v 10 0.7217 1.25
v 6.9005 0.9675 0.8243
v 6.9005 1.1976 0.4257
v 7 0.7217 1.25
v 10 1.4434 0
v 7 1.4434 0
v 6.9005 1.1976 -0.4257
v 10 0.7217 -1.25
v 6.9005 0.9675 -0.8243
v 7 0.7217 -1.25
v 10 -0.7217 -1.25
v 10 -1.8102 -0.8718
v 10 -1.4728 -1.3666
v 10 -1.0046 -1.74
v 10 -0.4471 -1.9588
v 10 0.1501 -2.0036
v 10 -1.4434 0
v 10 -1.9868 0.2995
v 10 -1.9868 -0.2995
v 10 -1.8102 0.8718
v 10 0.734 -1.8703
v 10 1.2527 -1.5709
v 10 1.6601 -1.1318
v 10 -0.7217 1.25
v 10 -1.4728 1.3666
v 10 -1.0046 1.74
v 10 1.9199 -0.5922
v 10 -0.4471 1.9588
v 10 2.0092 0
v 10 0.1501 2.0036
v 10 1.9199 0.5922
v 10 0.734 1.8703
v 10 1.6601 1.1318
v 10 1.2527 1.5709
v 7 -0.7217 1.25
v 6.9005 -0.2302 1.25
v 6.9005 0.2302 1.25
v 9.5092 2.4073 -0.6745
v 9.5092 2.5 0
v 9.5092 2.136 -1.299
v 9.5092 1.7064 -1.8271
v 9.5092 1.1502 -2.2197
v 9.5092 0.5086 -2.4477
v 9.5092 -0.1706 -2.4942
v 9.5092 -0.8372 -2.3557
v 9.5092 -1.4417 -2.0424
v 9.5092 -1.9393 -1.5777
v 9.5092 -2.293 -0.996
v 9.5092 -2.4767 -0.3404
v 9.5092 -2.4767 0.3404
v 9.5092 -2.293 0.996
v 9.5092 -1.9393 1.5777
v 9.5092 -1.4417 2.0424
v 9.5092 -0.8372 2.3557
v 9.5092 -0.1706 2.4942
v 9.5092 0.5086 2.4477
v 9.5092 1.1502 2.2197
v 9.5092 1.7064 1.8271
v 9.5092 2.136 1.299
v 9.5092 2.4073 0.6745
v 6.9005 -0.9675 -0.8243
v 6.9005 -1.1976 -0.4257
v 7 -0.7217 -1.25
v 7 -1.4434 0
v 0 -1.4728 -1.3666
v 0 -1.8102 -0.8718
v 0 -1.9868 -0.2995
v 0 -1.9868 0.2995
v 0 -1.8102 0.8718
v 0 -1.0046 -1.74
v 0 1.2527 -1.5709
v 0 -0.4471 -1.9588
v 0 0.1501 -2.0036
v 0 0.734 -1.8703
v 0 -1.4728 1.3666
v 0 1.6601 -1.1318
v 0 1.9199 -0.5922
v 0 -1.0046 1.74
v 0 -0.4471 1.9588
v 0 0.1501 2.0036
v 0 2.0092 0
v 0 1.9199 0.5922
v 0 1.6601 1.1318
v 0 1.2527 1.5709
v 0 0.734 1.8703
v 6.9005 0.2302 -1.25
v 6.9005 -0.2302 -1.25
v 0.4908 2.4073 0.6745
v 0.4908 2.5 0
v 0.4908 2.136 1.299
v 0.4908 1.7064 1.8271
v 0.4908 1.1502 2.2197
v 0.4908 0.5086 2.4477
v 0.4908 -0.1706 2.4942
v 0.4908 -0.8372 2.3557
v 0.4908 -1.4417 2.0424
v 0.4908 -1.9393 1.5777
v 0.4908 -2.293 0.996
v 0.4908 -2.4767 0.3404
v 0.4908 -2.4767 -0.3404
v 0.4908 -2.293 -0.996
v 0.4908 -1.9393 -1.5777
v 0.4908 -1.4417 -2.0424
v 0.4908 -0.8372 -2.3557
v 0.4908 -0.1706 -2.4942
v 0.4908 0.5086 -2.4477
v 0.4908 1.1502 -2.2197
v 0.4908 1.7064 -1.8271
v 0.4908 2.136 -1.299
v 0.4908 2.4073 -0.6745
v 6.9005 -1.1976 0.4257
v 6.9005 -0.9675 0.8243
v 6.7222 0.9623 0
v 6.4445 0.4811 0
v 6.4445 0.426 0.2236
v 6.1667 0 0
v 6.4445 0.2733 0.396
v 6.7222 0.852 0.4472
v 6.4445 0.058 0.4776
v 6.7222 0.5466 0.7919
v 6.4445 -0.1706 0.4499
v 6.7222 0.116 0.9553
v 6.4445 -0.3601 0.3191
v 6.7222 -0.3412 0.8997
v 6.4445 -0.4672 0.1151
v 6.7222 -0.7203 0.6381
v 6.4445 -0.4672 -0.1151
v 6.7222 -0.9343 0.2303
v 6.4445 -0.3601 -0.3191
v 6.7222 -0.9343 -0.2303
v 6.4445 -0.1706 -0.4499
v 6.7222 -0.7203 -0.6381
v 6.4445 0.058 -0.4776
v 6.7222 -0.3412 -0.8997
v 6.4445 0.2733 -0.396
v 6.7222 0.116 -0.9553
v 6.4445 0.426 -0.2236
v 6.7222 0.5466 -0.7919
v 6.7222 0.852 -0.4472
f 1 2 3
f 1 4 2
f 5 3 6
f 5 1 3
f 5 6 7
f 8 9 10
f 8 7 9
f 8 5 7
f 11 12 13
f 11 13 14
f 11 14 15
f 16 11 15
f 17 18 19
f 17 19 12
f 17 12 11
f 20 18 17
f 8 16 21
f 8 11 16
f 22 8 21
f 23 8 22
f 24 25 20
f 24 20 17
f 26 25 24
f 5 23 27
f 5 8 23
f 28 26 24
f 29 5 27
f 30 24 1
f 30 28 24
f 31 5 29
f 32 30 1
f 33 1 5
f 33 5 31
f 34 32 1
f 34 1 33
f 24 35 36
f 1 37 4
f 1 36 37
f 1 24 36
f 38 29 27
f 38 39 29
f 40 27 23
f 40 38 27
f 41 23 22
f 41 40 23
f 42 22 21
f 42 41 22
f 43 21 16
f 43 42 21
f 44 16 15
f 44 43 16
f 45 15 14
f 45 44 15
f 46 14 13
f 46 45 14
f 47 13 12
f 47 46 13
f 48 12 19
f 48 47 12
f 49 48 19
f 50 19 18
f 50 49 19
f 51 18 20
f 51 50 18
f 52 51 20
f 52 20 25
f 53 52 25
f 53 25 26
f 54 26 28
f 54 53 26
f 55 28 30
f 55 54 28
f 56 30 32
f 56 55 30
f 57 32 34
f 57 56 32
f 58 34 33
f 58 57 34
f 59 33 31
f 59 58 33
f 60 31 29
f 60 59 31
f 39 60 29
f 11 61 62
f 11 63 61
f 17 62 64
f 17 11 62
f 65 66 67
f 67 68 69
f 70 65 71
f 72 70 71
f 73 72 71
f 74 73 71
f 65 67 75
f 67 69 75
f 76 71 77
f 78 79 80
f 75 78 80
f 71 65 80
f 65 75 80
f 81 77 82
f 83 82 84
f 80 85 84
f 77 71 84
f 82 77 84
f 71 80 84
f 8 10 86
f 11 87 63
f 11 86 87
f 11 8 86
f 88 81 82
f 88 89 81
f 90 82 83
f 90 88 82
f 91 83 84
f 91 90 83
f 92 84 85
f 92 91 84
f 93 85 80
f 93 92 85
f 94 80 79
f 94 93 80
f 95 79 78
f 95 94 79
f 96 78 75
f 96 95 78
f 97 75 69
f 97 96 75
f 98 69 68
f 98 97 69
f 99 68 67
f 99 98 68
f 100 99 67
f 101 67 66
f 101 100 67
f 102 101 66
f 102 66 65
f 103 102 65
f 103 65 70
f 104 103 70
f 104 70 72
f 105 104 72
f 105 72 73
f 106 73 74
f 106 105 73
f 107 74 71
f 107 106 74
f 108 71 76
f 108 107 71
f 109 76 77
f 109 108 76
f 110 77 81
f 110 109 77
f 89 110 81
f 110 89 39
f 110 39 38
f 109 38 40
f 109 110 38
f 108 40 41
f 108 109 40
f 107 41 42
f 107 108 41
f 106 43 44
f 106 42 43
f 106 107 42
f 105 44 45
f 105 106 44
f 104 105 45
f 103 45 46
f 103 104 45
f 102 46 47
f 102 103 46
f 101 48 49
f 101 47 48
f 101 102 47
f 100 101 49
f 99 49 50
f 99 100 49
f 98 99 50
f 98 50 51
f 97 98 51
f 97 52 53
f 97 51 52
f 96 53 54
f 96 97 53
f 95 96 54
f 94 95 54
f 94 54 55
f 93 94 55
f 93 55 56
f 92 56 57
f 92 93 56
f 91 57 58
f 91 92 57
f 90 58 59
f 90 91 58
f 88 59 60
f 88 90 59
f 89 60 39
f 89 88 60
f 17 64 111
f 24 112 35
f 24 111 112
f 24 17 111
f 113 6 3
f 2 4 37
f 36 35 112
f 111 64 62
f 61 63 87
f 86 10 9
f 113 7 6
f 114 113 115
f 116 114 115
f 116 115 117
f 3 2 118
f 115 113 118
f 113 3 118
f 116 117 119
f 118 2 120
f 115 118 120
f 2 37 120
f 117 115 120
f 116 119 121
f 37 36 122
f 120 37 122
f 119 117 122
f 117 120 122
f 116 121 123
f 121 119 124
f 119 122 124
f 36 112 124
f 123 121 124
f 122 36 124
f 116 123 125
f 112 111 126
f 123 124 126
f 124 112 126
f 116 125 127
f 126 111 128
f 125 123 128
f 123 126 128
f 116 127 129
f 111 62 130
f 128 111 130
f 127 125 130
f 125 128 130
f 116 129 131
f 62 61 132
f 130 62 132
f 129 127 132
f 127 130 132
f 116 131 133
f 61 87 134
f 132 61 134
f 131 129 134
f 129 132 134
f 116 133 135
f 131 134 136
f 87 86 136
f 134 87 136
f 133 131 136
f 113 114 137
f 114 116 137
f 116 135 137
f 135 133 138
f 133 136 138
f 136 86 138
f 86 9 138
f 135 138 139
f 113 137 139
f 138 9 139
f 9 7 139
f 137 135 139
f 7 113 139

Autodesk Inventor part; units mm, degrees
ref_plane "YZ Plane" through (0, 0, 0) normal (1, 0, 0) x (0, 1, 0)
ref_plane "XZ Plane" through (0, 0, 0) normal (0, 1, 0) x (-1, 0, 0)
sketch "Skizze1" plane through (0, 0, 0) normal (0, 0, 1) x (1, 0, 0)
  line L0 (0, 0) -> (6.1667, 0)
  line L1 (10, 1.4434) -> (10, 2.5)
  line L2 (10, 2.5) -> (0, 2.5)
  line L3 (10, 1.4434) -> (7, 1.4434)
  line L4 (7, 1.4434) -> (6.1667, 0)
  line L5 (0, -0.5) -> (0, 3) projected
  line L6 (0, 2.5) -> (0, 0)
  dimension "d0" = 3
  dimension "d1" = 60
  dimension "d2" = 5
  dimension "d3" = 2.8868
  dimension "d5" = 10
revolve "Körper" add sketch "Skizze1" angle 360 about axis through (0, 0, 0) along (1, 0, 0)
sketch "Skizze2" plane through (10, 0, 0) normal (1, 0, 0) x (0, 1, 0)
  circle A0 centre (0, 0) radius 1.4434 projected
  line L0 (-0.7217, 1.25) -> (0.7217, 1.25)
  line L1 (0.7217, 1.25) -> (1.4434, 0)
  line L2 (1.4434, 0) -> (0.7217, -1.25)
  line L3 (0.7217, -1.25) -> (-0.7217, -1.25)
  line L4 (-0.7217, -1.25) -> (-1.4434, 0)
  line L5 (-1.4434, 0) -> (-0.7217, 1.25)
  point P0 (0, 0)
  point P1 (0, 0)
extrude "Loch" add sketch "Skizze2" against normal up to next contours L1 A0 | A0 L2 | L0 A0 | A0 L3 | L5 A0 | A0 L4
thread "Gewinde" size "M5x0.8" class "6g" standard "ISO Metric profile" length 10
chamfer "Fase1" distance 0.4908 angle 45 1 edges at (10, -2.5, 0) measured on face at (6.6667, 2.4919, -0.2012)
chamfer "Fase2" distance 0.4908 angle 45 1 edges at (0, -2.5, 0) measured on face at (3.1697, 2.4919, -0.2012)
ref_plane "Work Plane1" through (5, 0, 0) normal (0, 0, 1) x (1, 0, 0)
equation "\"d0\" = INTI"
equation "\"d2\" = NND"
equation "\"d3\" = 1.1547 * SW"
equation "\"d5\" = NLG"
equation "\"d8\" = NLG"
equation "\"d10\" = -0.5 * GD1 + 0.5 * NND"
equation "\"d11\" = FAWI"
equation "\"d34\" = -0.5 * GD1 + 0.5 * NND"
equation "\"d12\" = -0.5 * GD1 + 0.5 * NND"
equation "\"d13\" = FAWI"
equation "\"d35\" = -0.5 * GD1 + 0.5 * NND"
equation "\"NND\" = 5"
equation "\"NLG\" = 10"
equation "\"INTI\" = 3"
equation "\"FAWI\" = 45deg"
equation "\"SW\" = 2.5"
equation "\"GD1\" = THREADDIA - 1.2269 * PTC"
equation "\"SPD\" = 3.5"
equation "\"GUL\" = 0.61345 * PTC"
equation "\"TOA\" = 30deg"
equation "\"THREADDIA\" = 5"
equation "\"PTC\" = 0.8"
equation "\"FAWI1\" = 45deg"
equation "\"GAL\" = 0.61345 * PTC"
equation "\"E0\" = 1.155 * SW"
properties part number "DIN 913 - M5 x 10" material "Stahl, weich"
